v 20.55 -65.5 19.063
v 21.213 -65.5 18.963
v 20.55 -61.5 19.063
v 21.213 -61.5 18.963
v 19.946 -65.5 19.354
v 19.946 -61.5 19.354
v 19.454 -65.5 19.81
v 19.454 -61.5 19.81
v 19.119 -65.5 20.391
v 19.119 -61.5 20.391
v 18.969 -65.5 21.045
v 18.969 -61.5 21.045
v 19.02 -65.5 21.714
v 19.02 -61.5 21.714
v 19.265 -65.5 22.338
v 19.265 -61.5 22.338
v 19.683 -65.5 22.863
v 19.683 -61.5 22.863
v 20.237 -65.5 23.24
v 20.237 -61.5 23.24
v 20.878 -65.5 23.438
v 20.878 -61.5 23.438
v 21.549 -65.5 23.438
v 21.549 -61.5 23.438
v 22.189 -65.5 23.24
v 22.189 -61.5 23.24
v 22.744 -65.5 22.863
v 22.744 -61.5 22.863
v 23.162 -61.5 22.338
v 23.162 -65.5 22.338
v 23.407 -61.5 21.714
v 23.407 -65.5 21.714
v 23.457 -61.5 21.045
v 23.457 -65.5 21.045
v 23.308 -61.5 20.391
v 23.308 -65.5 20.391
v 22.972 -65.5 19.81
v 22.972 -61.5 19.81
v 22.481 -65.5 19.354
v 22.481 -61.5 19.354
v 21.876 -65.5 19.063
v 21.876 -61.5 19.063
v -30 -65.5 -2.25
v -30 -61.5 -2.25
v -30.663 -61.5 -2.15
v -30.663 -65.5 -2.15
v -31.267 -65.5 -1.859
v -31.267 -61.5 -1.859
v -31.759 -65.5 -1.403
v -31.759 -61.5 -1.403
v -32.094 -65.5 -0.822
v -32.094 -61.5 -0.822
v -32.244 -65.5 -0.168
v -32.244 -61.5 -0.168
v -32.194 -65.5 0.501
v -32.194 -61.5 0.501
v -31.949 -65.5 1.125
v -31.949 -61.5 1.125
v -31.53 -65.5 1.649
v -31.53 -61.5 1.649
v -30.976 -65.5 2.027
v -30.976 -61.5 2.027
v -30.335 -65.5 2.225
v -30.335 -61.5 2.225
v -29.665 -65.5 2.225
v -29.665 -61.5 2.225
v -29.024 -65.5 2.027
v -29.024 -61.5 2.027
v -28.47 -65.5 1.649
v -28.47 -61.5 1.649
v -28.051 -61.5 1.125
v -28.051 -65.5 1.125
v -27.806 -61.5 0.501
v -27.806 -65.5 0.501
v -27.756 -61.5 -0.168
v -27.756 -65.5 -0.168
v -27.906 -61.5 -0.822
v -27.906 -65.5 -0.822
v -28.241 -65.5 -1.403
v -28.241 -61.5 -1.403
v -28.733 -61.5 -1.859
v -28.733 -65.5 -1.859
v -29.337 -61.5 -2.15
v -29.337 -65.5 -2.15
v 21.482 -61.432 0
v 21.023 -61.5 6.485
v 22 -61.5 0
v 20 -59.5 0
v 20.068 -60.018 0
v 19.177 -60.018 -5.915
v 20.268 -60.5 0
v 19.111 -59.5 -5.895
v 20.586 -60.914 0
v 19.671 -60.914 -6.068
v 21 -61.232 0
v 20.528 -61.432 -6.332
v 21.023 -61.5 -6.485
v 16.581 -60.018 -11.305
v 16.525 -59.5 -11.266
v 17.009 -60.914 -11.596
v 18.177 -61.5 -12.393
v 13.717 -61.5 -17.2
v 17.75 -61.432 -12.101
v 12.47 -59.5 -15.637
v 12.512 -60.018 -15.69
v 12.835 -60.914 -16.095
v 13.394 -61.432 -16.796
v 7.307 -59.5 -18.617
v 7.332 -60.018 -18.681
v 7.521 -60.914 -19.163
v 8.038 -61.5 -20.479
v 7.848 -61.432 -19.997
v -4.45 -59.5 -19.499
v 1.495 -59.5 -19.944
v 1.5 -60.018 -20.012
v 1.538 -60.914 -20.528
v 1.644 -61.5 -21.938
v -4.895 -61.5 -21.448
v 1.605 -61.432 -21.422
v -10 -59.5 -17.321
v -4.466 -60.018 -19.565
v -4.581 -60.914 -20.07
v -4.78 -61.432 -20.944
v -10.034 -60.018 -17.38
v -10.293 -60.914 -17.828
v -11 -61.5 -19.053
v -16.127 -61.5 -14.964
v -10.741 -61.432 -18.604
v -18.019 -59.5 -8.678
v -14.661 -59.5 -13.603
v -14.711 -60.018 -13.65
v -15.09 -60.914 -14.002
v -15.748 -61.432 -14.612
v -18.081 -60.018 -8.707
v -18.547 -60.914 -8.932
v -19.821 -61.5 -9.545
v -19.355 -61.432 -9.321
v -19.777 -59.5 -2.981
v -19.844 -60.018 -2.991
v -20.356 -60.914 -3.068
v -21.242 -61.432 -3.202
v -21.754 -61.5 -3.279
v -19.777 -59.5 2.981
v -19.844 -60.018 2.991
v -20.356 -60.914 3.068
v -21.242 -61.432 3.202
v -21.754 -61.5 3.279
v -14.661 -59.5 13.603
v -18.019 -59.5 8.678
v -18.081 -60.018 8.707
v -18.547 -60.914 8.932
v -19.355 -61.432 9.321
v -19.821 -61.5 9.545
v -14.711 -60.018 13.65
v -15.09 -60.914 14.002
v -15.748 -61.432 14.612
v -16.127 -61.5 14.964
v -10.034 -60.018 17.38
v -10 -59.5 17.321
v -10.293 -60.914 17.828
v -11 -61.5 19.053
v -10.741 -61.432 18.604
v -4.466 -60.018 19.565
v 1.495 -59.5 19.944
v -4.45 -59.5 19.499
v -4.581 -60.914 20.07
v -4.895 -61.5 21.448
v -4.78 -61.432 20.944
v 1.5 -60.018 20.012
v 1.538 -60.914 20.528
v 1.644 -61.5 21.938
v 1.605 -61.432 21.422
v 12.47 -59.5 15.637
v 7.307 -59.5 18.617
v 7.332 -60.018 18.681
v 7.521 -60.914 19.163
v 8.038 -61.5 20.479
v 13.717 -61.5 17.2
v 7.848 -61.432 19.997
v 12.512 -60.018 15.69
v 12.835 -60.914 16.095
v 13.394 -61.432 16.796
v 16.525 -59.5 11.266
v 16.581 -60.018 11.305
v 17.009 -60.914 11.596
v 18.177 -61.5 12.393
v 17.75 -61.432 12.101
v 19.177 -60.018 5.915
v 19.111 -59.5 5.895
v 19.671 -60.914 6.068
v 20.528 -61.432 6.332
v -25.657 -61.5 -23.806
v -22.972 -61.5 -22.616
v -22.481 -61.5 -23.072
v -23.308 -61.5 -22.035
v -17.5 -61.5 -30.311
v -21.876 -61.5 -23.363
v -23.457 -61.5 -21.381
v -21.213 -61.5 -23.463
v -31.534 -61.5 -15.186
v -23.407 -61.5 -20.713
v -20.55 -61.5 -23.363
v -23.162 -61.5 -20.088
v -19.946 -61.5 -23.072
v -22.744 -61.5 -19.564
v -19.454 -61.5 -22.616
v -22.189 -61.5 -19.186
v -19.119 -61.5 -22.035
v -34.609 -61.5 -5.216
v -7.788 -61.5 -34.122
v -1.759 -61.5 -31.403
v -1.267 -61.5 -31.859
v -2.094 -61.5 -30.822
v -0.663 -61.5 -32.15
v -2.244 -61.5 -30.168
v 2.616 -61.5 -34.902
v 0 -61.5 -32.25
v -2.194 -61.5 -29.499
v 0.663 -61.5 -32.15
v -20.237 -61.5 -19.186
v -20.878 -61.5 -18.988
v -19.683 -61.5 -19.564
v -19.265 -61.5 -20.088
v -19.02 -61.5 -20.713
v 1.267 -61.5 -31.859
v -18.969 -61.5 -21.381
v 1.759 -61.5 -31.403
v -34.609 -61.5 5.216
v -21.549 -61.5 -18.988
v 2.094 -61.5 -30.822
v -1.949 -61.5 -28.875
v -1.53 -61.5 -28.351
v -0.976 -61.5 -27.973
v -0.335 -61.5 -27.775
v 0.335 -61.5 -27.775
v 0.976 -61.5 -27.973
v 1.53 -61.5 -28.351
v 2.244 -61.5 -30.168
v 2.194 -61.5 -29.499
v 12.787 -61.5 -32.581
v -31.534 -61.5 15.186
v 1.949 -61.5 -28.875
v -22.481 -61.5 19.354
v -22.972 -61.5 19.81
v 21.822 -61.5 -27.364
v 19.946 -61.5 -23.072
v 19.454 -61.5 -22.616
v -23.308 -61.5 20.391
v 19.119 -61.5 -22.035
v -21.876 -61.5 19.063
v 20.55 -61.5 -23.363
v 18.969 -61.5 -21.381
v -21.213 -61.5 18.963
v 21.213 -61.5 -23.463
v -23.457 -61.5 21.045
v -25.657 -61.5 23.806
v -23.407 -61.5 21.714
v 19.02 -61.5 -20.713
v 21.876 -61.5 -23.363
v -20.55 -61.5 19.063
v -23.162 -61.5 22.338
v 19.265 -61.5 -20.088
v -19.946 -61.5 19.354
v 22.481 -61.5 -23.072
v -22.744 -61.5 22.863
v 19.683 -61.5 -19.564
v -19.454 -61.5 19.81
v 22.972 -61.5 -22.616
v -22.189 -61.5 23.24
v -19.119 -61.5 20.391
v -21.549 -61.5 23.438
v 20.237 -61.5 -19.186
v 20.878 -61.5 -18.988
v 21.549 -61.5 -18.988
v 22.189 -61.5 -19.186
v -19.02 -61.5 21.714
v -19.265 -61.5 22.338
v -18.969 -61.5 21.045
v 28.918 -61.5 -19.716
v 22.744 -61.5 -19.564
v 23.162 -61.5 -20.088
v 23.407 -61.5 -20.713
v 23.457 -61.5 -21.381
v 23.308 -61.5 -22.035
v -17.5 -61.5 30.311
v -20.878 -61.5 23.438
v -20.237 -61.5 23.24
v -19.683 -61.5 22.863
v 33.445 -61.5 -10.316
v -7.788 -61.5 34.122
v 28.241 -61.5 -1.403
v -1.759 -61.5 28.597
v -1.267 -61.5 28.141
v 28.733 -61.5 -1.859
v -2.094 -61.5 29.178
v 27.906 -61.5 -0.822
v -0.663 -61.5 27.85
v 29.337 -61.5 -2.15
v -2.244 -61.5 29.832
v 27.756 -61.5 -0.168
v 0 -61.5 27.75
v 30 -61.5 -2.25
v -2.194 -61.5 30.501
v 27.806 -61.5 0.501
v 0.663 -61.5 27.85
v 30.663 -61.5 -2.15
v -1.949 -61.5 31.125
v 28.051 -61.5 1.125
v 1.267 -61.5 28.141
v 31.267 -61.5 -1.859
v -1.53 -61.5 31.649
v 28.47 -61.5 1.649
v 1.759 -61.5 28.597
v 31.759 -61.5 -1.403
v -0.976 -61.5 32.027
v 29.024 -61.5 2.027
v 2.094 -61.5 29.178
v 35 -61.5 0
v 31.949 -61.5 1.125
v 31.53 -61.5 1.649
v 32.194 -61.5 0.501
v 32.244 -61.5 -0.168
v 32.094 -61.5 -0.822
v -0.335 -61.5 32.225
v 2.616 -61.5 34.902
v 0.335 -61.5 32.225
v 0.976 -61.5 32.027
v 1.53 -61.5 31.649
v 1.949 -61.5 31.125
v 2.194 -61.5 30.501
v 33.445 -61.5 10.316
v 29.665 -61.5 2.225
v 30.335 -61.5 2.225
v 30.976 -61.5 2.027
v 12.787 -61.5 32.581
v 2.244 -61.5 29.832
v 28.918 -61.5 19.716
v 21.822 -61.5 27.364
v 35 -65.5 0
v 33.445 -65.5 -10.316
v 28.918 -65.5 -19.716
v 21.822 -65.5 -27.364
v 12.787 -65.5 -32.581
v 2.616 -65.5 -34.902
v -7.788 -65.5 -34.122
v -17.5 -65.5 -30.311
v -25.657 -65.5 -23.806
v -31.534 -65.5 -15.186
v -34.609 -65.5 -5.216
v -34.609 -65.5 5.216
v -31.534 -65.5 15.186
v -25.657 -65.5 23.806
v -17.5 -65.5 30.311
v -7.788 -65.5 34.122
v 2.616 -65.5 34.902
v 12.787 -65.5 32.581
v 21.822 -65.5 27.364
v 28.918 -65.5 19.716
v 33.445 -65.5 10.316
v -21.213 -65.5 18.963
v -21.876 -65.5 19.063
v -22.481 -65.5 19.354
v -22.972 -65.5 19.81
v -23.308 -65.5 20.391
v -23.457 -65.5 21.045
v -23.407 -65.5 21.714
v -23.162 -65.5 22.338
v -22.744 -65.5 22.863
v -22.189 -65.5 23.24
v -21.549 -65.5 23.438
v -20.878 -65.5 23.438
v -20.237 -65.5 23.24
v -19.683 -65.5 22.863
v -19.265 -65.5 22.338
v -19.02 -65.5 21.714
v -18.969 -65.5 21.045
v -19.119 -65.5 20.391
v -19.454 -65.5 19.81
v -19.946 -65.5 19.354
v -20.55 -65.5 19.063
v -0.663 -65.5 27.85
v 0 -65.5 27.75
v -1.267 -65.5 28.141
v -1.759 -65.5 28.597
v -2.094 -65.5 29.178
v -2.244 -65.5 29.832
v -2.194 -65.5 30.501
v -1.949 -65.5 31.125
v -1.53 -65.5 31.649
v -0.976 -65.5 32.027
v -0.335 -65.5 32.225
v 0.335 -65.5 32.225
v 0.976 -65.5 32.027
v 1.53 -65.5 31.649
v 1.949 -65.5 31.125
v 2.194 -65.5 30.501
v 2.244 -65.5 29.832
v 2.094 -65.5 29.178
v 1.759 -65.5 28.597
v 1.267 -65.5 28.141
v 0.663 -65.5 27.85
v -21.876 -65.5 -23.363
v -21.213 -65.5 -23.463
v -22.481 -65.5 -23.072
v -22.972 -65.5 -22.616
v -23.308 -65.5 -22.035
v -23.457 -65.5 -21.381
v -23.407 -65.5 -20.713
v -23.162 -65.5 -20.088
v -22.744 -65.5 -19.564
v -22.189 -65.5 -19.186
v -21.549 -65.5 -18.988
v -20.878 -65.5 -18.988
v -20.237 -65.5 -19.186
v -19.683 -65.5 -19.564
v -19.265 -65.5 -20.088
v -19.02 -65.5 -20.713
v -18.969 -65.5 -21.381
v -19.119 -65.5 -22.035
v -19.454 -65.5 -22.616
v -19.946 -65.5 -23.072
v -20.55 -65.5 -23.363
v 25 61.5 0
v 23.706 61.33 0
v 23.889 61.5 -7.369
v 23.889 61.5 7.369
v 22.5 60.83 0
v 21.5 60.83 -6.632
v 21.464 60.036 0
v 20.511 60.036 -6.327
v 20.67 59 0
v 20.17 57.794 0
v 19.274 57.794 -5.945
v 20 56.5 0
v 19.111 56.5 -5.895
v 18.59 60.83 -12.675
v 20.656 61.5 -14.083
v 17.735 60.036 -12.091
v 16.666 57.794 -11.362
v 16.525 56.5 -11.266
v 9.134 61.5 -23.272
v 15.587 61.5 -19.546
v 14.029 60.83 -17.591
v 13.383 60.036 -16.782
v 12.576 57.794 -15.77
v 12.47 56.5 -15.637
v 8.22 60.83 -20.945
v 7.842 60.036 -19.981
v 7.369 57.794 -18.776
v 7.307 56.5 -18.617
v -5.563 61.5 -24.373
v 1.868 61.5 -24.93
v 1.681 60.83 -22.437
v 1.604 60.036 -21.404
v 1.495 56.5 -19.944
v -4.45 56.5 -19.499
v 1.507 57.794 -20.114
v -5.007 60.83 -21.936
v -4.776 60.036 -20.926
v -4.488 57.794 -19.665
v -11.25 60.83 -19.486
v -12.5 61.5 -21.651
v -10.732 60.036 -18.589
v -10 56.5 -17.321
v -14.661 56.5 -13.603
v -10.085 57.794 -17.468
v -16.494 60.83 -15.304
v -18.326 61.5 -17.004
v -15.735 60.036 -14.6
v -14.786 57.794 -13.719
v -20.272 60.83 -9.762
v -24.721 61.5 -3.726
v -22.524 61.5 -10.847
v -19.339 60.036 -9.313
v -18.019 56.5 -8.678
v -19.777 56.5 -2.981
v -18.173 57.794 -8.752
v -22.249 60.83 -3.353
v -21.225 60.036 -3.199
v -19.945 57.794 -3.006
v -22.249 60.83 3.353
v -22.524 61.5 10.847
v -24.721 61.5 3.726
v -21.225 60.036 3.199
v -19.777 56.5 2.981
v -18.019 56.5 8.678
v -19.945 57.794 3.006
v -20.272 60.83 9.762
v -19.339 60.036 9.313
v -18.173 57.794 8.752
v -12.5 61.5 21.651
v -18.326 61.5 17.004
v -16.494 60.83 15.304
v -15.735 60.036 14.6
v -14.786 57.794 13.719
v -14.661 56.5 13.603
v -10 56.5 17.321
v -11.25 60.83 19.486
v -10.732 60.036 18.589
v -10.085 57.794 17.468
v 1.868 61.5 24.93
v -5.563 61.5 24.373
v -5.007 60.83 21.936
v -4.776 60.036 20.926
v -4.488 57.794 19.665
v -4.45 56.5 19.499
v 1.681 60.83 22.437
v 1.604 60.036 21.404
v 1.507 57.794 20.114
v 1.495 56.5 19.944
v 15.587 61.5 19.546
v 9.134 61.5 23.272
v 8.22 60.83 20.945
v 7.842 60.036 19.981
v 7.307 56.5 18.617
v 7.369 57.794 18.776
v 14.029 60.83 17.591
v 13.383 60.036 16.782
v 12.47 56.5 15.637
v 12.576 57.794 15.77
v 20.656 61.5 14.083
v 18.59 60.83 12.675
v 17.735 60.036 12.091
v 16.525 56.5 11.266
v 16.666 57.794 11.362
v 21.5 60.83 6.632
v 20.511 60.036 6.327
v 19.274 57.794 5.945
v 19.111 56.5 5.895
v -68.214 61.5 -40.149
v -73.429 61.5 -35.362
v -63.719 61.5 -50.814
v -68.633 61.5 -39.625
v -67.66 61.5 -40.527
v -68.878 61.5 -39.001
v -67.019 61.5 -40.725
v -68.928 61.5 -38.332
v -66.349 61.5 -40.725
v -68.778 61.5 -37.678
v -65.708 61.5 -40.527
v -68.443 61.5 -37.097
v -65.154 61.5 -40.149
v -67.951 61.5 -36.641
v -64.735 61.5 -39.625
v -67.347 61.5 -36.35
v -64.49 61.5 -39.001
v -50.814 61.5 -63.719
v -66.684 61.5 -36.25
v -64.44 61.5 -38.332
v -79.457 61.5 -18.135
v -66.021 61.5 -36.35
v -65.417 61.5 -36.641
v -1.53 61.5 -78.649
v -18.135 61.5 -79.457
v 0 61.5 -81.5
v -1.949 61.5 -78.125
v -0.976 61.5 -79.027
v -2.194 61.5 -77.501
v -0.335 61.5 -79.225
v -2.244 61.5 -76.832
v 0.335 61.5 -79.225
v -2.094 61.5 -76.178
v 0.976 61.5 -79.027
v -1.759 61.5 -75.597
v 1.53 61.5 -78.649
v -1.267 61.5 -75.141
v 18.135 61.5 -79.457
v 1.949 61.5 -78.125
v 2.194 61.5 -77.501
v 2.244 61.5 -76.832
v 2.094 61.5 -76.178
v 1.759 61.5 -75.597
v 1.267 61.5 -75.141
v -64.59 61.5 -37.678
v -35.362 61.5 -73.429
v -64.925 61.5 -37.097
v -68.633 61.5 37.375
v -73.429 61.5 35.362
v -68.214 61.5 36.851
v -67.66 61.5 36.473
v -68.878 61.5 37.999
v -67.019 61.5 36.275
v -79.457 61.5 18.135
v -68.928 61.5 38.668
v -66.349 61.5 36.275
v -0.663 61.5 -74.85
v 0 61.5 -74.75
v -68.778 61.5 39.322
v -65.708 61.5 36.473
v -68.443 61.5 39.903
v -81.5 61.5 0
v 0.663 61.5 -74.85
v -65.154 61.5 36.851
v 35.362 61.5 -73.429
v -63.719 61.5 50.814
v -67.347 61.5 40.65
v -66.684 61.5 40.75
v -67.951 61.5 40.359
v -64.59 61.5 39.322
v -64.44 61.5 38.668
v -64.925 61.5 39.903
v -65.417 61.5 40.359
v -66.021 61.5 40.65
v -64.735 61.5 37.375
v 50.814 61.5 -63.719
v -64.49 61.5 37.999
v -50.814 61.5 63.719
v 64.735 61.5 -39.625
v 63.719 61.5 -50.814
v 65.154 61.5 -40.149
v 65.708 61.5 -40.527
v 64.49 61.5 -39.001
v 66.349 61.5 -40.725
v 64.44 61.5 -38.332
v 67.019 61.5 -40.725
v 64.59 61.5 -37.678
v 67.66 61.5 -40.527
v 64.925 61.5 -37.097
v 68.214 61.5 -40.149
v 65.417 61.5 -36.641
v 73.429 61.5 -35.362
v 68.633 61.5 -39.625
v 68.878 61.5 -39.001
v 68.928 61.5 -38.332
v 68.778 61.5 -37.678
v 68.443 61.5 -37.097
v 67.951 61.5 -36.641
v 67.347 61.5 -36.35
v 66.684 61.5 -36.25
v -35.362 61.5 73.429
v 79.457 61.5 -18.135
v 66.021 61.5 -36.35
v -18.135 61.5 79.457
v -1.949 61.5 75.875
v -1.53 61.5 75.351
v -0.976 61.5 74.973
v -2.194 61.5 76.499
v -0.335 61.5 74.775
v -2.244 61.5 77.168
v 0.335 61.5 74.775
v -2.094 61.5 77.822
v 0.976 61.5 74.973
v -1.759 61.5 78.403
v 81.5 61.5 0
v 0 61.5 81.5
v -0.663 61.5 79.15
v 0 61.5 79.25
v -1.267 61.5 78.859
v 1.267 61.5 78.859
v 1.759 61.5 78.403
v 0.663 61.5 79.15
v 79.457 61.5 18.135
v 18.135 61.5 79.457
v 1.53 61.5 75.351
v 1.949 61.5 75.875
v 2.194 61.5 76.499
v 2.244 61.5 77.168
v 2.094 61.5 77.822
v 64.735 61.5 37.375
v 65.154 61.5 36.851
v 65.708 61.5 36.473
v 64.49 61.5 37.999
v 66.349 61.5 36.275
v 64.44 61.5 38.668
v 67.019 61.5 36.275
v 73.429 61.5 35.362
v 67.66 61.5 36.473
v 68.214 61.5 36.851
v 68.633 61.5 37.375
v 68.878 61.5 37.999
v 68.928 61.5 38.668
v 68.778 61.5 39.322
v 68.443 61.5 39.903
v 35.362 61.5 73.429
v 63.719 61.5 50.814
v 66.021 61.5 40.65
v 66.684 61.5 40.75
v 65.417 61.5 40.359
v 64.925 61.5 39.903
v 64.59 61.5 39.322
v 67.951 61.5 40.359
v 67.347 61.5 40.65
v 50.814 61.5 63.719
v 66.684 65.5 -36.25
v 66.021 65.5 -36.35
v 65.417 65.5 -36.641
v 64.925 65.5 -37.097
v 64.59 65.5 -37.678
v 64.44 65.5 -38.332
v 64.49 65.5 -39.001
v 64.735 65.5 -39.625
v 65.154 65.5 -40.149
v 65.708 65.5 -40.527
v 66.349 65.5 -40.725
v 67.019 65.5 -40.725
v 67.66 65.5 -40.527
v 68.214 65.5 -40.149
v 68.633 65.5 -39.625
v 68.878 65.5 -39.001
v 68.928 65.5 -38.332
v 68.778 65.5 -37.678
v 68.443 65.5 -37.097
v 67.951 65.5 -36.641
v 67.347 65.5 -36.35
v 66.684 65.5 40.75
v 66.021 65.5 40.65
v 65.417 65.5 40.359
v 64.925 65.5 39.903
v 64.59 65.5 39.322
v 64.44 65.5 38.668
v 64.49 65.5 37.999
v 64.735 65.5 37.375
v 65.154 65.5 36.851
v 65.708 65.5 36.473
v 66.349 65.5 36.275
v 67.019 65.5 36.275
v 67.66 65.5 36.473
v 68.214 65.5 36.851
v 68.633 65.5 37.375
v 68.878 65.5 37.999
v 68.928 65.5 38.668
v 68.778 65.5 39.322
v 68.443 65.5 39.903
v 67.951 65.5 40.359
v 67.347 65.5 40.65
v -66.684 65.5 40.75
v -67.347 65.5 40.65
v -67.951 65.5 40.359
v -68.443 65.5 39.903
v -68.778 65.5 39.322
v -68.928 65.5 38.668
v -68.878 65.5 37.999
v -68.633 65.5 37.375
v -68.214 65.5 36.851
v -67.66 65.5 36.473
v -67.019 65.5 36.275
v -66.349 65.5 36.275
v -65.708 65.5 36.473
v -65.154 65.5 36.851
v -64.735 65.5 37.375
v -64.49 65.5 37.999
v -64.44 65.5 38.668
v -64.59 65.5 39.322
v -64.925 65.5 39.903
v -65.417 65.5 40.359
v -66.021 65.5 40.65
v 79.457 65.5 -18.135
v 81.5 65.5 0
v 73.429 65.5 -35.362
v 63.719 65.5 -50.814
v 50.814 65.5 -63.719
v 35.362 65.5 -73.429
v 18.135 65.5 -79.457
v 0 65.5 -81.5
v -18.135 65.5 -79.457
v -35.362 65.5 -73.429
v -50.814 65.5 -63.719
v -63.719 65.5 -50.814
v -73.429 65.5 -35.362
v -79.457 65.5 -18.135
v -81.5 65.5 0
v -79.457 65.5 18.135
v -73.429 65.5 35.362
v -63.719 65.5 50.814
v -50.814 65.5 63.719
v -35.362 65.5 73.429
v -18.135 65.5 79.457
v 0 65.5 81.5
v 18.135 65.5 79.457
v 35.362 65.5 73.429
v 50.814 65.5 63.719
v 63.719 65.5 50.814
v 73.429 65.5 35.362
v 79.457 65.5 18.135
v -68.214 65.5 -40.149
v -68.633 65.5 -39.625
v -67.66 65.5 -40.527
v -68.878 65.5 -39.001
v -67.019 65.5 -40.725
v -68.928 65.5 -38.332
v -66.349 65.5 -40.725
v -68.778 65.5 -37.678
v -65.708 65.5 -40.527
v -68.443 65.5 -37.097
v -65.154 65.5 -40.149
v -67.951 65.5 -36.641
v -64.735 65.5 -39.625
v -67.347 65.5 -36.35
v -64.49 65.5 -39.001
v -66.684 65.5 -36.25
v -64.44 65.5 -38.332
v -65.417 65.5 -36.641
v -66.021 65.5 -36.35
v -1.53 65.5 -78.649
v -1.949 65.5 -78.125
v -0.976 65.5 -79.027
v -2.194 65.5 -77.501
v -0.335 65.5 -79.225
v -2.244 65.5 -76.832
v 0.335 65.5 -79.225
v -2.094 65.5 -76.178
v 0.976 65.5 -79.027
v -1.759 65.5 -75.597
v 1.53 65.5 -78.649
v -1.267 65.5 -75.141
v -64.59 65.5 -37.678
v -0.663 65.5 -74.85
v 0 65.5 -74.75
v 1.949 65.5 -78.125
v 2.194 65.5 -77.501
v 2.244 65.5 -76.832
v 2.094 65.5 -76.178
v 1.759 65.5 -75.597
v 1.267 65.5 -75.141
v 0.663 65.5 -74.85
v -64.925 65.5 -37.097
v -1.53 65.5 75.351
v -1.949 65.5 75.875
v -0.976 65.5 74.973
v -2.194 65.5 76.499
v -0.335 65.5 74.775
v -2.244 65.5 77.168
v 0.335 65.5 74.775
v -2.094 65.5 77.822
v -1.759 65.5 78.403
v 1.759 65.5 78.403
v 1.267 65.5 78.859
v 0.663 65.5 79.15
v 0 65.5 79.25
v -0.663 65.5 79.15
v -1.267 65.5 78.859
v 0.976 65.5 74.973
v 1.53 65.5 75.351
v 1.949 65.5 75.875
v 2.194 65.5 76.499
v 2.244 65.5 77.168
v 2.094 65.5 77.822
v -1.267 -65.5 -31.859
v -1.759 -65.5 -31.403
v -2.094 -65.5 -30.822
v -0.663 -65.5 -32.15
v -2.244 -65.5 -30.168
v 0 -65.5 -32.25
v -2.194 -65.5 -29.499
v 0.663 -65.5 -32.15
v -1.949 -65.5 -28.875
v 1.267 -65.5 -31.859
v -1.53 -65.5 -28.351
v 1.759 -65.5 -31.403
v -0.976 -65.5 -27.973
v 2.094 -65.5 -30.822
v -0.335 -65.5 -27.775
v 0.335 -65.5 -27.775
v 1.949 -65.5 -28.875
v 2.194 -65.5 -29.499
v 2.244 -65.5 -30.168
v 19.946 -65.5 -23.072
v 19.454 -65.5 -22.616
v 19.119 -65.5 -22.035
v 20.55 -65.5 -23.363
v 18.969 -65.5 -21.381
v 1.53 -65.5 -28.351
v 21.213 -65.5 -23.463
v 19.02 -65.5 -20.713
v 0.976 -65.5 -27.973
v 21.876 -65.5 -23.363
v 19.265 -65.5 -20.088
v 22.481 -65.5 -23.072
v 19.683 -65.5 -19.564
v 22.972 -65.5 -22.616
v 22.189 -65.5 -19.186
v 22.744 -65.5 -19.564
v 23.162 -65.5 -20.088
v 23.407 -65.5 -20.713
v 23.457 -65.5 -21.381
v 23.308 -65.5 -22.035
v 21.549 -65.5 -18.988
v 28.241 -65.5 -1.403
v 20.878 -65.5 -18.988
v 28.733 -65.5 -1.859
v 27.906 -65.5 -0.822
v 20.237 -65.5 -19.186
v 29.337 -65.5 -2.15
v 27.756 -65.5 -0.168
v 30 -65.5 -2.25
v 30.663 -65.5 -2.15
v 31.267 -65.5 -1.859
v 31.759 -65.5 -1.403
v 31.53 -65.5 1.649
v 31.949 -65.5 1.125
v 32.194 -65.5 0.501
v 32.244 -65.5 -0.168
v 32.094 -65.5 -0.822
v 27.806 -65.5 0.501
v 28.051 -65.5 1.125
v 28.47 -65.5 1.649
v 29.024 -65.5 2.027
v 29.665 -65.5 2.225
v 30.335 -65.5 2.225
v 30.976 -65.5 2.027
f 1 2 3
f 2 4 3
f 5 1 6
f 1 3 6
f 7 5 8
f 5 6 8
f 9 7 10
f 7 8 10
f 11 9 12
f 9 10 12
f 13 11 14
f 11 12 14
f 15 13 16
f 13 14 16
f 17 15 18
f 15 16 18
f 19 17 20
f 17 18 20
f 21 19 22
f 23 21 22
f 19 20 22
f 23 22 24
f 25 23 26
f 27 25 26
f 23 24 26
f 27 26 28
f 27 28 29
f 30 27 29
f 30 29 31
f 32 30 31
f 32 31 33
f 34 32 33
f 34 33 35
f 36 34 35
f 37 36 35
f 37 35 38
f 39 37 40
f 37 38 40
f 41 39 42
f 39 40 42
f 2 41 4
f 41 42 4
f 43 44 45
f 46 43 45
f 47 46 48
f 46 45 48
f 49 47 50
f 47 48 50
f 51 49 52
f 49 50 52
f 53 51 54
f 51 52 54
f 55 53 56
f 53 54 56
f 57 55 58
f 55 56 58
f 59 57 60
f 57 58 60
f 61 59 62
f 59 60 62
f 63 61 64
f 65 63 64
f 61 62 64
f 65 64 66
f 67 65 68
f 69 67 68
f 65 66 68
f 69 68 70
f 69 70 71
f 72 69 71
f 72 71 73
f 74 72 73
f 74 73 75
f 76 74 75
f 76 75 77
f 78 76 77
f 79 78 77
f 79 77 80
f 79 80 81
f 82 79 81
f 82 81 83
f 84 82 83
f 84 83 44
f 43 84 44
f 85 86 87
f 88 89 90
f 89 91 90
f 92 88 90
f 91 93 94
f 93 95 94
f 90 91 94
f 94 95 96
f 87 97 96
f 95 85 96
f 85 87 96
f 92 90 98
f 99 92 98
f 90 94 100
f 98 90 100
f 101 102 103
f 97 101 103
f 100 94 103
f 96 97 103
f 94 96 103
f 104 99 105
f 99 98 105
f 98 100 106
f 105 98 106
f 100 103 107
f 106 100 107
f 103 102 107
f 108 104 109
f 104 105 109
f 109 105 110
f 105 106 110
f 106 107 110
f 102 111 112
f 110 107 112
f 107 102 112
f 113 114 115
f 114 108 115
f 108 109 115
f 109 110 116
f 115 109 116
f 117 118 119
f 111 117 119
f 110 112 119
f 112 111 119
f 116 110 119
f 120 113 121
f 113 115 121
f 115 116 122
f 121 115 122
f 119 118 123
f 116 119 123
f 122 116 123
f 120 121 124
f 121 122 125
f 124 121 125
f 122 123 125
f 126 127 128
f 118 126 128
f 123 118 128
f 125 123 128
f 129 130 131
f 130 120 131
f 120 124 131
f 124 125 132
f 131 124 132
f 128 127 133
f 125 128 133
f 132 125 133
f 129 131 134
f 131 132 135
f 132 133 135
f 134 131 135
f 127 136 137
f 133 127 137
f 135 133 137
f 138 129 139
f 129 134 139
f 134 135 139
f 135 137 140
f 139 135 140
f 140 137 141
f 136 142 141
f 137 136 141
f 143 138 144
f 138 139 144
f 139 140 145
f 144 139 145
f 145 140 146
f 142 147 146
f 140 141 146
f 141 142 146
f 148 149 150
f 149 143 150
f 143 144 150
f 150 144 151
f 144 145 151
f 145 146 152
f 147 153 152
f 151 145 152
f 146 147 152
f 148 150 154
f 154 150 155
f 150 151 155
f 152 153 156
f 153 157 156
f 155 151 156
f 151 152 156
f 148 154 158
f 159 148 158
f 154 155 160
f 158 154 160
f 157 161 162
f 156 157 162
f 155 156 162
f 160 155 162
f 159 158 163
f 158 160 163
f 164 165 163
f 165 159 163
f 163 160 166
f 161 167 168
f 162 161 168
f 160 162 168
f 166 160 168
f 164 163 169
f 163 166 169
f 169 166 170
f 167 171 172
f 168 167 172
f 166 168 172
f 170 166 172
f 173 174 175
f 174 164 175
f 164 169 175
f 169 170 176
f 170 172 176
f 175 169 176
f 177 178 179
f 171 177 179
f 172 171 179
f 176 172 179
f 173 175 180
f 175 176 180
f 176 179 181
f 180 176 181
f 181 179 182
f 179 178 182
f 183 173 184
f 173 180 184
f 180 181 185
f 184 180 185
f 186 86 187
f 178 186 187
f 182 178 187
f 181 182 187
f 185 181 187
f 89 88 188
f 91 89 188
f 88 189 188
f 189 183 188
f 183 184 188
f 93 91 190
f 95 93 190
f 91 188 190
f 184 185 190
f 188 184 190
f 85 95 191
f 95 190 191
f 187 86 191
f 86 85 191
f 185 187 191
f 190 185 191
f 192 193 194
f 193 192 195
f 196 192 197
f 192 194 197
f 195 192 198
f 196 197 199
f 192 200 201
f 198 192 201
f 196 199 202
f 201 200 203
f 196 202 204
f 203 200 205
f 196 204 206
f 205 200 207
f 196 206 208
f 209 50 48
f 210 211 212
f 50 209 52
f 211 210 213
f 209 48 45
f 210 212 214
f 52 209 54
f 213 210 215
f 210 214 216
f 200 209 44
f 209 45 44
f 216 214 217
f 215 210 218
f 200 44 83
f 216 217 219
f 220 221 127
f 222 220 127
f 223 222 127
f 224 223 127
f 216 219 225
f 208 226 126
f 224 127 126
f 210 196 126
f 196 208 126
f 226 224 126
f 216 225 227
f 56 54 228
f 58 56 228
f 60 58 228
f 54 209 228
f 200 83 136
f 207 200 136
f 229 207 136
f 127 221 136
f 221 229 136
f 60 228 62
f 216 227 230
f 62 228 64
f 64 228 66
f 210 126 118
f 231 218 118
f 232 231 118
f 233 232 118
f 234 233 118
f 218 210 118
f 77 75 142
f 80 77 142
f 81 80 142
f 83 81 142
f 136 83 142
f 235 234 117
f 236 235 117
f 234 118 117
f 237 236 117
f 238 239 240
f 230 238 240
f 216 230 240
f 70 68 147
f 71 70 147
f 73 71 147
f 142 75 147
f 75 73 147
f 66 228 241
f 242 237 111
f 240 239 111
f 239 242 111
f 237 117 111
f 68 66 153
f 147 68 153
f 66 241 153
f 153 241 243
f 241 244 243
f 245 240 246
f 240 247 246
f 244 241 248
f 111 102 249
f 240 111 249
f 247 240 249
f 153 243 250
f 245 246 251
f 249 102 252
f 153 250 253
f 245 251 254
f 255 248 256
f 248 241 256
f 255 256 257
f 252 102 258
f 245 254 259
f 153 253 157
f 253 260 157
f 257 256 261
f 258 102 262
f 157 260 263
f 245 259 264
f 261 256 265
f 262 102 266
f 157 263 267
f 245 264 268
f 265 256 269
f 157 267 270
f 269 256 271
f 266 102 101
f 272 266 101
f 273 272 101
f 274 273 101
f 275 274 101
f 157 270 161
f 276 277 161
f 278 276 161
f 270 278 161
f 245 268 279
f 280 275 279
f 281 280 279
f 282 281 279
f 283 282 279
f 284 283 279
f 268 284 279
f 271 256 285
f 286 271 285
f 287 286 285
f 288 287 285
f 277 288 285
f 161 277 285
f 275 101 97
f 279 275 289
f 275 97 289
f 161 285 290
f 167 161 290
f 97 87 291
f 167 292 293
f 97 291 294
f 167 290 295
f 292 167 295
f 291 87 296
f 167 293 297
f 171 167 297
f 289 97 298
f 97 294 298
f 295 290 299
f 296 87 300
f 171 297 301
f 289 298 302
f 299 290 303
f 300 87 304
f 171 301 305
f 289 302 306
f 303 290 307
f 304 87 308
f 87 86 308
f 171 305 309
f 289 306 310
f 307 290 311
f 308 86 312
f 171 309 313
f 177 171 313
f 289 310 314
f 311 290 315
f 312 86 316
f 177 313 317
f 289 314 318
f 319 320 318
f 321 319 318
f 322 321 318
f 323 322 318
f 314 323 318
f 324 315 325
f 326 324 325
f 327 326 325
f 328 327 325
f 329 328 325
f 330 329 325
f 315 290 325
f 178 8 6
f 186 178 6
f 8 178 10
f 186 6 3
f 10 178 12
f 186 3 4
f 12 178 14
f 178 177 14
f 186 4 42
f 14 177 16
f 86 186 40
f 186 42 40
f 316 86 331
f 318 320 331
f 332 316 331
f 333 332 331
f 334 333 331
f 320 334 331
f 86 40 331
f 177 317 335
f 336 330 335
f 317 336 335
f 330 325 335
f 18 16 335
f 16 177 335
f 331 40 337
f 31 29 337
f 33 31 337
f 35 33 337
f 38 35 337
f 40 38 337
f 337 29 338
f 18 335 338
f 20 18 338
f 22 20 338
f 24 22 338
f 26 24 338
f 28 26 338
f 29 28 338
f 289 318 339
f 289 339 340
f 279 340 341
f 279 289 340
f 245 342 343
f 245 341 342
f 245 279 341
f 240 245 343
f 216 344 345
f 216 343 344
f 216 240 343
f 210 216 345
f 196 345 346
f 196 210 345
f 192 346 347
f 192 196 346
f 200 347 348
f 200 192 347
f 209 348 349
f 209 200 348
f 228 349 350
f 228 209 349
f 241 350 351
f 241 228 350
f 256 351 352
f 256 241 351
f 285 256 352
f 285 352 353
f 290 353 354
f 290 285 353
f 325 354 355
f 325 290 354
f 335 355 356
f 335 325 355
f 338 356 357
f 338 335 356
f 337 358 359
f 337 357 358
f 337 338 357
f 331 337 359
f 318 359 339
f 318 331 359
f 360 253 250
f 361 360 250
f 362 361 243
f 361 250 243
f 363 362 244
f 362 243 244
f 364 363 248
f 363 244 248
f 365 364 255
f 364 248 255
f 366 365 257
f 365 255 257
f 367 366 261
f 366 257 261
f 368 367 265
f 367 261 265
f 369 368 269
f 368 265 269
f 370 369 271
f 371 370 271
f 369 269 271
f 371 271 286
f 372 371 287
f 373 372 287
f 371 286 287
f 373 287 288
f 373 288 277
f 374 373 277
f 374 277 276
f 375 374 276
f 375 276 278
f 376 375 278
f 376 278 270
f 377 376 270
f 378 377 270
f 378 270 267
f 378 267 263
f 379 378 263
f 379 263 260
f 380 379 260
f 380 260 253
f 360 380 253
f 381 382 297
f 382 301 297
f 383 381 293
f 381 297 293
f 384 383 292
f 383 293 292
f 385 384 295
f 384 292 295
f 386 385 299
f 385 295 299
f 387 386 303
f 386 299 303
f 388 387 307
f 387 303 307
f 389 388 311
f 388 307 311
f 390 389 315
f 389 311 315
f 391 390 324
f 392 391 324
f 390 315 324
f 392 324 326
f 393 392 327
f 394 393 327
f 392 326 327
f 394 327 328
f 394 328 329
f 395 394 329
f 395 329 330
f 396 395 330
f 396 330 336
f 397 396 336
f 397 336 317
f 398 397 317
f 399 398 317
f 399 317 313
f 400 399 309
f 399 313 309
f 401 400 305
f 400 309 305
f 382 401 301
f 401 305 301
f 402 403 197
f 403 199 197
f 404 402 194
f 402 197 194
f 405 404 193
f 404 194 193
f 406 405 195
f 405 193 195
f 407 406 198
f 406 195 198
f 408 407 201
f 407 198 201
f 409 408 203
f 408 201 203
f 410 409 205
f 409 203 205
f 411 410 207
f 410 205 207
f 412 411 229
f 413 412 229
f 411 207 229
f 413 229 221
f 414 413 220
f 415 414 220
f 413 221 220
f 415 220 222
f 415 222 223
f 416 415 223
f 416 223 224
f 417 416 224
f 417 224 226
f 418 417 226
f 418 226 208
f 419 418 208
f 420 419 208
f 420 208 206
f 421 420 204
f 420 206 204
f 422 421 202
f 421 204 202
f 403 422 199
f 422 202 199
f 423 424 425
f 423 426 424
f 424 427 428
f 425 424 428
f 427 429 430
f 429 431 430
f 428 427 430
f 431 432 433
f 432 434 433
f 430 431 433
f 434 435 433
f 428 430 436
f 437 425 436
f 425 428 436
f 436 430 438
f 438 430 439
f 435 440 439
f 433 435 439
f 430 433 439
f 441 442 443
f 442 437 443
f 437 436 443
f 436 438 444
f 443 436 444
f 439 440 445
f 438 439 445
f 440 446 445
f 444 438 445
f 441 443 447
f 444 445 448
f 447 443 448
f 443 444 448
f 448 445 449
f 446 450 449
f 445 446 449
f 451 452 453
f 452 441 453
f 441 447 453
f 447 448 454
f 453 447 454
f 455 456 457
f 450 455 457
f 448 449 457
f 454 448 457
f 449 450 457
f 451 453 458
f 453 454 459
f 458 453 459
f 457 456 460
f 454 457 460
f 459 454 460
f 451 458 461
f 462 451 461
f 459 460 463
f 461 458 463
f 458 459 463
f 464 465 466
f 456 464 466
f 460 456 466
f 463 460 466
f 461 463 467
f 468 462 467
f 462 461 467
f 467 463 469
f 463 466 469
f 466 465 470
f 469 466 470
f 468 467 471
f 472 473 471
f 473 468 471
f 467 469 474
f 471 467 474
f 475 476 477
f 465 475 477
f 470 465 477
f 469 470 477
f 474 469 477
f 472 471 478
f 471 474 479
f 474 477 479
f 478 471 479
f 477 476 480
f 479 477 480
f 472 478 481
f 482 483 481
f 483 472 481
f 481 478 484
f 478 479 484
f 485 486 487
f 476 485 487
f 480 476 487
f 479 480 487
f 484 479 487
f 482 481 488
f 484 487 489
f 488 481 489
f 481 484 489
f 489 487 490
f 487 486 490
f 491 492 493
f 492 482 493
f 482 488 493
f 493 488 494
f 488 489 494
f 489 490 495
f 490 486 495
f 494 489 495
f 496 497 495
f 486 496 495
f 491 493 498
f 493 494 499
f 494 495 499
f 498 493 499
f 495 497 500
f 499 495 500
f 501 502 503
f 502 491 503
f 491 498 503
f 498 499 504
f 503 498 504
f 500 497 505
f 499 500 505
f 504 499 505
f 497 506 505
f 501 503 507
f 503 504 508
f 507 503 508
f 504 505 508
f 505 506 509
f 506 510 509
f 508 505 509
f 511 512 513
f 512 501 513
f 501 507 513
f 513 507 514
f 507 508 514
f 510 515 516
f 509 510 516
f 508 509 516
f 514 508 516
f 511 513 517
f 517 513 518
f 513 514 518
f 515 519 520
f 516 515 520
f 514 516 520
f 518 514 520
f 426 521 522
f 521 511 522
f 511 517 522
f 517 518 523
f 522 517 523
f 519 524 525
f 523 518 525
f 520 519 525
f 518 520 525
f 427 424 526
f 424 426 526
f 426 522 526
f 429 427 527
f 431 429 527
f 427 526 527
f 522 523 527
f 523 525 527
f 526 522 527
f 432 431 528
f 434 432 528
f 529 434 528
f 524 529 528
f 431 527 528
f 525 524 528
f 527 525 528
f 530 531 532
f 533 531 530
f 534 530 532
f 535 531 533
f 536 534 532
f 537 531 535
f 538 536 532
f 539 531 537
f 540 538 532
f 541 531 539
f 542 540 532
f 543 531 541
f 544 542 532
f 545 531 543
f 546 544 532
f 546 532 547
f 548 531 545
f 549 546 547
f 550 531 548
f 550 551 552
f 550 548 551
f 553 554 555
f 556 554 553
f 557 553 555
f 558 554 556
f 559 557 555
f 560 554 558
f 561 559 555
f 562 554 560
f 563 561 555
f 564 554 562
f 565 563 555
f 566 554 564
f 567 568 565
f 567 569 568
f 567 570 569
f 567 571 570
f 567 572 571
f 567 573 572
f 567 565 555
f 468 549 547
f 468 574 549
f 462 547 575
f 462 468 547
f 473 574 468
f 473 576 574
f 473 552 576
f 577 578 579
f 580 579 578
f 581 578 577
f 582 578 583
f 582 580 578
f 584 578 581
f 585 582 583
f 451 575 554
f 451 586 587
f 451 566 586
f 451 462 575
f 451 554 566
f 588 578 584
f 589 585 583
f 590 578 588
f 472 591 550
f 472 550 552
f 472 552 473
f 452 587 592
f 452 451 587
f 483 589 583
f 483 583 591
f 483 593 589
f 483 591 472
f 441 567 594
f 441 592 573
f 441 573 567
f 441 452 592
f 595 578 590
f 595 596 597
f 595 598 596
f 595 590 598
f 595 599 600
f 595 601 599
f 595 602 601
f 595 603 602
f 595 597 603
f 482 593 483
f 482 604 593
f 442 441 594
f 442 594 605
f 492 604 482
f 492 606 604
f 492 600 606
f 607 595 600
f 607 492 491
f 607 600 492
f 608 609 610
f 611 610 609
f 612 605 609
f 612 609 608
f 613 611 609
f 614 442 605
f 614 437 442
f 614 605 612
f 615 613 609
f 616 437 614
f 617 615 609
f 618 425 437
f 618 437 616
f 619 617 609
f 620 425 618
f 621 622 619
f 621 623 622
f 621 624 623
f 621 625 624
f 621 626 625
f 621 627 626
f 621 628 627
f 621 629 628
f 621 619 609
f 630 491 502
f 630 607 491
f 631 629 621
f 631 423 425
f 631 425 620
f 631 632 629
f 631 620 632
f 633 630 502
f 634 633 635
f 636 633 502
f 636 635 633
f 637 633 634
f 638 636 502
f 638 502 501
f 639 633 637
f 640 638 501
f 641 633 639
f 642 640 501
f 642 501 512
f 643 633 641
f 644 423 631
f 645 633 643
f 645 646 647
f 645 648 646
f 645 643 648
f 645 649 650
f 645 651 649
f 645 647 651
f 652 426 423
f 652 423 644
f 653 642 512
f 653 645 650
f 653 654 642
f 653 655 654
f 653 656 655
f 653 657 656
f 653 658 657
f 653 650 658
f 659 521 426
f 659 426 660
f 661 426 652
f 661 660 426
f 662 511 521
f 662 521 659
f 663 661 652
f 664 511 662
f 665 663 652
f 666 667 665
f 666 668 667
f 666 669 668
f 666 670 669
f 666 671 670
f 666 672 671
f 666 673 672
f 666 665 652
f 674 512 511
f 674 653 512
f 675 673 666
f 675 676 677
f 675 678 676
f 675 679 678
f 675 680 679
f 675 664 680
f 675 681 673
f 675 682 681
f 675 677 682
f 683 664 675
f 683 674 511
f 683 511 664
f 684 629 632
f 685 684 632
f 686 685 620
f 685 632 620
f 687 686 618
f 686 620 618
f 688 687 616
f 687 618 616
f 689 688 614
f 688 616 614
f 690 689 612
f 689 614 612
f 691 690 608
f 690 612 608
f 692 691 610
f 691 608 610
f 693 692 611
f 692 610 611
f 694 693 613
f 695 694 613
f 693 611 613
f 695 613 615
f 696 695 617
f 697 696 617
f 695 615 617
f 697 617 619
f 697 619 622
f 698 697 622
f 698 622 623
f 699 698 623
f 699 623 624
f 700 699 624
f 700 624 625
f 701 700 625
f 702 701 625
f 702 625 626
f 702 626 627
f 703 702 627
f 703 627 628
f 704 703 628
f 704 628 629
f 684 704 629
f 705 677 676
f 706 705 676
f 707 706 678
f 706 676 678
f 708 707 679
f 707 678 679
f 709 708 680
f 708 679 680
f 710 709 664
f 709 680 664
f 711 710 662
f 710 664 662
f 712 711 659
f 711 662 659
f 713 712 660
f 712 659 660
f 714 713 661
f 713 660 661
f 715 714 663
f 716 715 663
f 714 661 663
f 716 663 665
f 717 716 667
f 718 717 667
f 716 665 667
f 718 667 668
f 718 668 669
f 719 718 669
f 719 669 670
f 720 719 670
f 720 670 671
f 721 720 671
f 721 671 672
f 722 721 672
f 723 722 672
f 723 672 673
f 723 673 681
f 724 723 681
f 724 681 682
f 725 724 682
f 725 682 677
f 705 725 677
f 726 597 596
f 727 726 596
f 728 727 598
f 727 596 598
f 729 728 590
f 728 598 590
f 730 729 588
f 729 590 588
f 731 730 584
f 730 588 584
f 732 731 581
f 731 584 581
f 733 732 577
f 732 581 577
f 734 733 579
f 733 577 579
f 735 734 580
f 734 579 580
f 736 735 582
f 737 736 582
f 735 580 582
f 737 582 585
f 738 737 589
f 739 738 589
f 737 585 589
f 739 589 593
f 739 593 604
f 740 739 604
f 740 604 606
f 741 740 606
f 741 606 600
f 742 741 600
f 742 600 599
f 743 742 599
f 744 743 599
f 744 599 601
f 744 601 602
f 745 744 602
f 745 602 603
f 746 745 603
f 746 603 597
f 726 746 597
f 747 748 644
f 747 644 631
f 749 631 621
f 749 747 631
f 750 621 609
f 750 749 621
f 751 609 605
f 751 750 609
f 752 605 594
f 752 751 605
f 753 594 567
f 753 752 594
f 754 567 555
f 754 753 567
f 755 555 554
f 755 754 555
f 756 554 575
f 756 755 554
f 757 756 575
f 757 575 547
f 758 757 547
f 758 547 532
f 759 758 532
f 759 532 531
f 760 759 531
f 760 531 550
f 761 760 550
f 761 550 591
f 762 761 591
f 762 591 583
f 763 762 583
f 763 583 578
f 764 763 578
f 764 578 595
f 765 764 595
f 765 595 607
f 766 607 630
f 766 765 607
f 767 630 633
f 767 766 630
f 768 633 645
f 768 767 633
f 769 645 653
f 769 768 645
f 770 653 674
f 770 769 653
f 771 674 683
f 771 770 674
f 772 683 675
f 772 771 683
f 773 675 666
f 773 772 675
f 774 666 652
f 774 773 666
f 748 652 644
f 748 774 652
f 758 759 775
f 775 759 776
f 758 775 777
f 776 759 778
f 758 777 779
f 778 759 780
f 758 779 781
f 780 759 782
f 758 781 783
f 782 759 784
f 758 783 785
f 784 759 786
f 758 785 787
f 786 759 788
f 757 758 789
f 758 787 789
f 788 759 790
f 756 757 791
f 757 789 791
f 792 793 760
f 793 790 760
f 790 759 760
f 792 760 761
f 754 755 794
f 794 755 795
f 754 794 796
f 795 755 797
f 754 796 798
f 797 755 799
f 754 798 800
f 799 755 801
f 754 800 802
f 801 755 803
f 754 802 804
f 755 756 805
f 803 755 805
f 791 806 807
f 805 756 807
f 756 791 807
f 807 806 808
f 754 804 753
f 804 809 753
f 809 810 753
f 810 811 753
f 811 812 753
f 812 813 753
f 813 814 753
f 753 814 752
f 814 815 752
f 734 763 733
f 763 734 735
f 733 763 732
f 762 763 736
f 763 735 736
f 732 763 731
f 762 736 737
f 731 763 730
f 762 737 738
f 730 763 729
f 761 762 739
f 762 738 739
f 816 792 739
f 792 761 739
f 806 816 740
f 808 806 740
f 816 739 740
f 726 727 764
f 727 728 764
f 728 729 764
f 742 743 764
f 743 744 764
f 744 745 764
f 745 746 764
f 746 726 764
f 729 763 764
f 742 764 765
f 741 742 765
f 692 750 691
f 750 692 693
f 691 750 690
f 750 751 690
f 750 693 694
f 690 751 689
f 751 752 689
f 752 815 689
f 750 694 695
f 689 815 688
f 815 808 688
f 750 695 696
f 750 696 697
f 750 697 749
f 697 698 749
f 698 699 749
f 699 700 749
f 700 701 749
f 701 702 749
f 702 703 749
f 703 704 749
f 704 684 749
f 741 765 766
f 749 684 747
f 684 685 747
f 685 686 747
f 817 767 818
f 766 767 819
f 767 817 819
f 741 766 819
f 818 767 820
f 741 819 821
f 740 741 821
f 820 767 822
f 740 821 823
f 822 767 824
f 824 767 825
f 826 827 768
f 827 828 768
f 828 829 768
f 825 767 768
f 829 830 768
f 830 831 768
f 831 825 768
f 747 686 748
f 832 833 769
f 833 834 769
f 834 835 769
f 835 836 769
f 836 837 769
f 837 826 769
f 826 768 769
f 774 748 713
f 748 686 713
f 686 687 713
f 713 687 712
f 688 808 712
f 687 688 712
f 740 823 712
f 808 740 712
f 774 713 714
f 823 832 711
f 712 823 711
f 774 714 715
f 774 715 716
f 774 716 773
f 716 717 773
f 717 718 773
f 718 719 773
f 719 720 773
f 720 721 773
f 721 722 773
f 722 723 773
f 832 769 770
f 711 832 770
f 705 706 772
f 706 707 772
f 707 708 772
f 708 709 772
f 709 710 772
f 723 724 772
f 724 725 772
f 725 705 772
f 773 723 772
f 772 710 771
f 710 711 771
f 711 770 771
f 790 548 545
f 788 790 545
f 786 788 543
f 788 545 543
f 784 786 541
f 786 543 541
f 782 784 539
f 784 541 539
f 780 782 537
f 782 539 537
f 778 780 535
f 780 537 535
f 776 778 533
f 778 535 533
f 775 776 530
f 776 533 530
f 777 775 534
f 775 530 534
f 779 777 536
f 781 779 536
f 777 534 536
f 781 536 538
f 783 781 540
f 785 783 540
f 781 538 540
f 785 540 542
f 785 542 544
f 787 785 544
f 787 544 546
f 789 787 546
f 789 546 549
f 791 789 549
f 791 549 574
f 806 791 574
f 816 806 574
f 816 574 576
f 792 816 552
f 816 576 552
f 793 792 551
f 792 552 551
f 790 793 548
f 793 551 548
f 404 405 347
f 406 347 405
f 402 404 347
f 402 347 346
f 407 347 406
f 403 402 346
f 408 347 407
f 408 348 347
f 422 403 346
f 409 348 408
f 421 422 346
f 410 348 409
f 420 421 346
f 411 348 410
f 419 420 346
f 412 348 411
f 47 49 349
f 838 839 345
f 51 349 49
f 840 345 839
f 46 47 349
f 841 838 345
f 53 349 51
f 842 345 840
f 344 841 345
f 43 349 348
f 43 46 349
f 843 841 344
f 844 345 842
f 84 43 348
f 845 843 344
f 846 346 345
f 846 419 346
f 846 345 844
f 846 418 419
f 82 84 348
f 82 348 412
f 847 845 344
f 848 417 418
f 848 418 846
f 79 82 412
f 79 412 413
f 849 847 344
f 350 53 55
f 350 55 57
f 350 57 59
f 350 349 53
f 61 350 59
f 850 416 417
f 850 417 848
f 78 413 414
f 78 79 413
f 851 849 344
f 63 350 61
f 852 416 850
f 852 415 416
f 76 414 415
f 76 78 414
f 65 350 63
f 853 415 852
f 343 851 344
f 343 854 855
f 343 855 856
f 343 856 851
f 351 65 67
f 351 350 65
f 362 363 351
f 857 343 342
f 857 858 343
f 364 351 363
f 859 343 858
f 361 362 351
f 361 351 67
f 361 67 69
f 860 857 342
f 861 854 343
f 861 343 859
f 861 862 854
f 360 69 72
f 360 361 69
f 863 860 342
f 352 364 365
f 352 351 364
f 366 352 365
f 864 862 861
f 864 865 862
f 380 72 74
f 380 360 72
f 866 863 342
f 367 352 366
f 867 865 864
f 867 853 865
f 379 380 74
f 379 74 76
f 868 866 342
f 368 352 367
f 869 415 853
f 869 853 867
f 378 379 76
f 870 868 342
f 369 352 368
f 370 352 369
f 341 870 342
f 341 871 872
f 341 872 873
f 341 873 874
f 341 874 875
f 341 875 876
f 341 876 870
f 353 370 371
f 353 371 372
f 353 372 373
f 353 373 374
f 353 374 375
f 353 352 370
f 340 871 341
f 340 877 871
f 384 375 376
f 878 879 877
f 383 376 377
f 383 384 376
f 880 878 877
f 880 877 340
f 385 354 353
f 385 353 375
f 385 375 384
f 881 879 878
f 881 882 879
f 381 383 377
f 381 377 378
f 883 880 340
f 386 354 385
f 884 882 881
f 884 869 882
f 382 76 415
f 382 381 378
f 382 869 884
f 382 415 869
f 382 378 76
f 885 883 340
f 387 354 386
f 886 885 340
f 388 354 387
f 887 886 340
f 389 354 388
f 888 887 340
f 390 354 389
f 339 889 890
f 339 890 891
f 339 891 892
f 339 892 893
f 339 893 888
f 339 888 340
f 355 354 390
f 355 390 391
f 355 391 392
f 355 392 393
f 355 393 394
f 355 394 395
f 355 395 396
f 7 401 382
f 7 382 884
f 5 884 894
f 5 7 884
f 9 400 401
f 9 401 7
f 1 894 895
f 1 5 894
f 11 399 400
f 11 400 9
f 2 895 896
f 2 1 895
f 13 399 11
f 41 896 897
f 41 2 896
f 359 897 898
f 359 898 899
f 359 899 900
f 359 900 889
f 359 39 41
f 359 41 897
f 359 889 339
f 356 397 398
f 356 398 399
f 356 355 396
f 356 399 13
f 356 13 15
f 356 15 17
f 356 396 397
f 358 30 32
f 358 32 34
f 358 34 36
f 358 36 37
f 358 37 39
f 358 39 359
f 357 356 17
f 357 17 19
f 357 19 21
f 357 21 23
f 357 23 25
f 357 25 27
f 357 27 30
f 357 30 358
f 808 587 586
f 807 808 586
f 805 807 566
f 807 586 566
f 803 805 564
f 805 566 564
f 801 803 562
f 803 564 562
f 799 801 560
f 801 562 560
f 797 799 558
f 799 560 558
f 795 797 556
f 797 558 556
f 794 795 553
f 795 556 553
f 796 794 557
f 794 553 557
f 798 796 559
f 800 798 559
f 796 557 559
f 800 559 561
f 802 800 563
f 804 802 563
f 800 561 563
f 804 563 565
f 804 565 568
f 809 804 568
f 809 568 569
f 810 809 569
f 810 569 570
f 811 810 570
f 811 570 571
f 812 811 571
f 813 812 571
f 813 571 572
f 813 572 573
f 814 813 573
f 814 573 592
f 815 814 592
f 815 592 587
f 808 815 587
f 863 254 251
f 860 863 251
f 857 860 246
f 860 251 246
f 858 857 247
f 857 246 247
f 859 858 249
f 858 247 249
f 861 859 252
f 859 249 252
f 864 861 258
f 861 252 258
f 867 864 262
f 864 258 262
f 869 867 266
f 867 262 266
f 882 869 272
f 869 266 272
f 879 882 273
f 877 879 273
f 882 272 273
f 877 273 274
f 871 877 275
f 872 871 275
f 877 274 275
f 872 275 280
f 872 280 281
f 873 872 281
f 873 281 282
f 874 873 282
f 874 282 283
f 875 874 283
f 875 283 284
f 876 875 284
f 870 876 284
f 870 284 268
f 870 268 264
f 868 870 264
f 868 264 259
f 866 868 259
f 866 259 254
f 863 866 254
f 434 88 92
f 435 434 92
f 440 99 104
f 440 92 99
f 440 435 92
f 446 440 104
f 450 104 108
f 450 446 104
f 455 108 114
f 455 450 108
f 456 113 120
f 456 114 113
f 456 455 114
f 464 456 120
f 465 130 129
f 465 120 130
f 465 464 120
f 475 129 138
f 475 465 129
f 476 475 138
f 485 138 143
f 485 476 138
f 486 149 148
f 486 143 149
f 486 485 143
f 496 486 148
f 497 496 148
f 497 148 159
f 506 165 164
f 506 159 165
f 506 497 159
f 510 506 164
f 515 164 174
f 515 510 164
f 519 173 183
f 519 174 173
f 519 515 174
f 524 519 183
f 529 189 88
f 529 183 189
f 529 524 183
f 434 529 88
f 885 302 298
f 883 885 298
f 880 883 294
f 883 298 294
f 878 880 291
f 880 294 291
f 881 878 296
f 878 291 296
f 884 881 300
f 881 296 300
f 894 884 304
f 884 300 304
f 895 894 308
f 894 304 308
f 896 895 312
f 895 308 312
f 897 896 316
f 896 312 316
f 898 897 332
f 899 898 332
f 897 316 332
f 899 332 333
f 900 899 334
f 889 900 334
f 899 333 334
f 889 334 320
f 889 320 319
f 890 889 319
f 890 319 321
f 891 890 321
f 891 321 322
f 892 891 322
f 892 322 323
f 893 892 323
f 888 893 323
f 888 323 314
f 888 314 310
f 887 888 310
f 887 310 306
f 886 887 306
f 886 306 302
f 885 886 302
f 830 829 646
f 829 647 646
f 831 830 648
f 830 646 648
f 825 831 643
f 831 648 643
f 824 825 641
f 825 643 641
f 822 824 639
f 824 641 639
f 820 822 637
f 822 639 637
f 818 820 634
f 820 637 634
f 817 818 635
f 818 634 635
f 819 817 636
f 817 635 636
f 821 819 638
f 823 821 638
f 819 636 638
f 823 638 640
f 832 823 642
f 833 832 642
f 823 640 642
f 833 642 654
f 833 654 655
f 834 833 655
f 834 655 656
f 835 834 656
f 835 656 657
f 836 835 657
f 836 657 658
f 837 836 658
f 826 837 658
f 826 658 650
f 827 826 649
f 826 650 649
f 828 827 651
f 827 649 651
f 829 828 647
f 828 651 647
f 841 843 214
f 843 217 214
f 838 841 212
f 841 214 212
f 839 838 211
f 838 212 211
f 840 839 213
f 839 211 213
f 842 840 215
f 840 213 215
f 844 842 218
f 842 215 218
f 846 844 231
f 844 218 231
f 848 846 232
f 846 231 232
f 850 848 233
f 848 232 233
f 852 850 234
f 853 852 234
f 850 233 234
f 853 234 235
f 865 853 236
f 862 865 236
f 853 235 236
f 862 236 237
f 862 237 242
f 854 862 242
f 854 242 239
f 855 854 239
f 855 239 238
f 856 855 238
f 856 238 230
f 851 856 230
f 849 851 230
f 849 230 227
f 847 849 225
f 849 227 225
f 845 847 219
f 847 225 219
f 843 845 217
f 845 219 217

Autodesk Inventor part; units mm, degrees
ref_plane "YZ Plane" through (0, 0, 0) normal (1, 0, 0) x (0, 1, 0)
ref_plane "XZ Plane" through (0, 0, 0) normal (0, 1, 0) x (-1, 0, 0)
ref_plane "XY Plane" through (0, 0, 0) normal (0, 0, 1) x (1, 0, 0)
sketch "Sketch1" plane through (0, 0, 0) normal (0, 0, 1) x (1, 0, 0)
  line L0 (0, 91.7) -> (0, -91.7) construction
  line L1 (-16.3, 0) -> (97.8, 0) construction
  line L2 (0, -65.5) -> (0, 65.5)
  line L3 (0, -65.5) -> (81.5, -65.5)
  line L4 (81.5, -65.5) -> (81.5, 65.5)
  line L5 (81.5, 65.5) -> (0, 65.5)
  point P0 (0, 0)
  dimension "d2" = 131
  dimension "d12" = 81.5
revolve "Revolution1" add sketch "Sketch1" angle 360 about axis through (0, 0, 0) along (0, -1, 0)
sketch "Sketch4" plane through (0, 0, 0) normal (0, 0, 1) x (1, 0, 0)
  line L0 (-81.5, 65.5) -> (81.5, 65.5) construction
  line L1 (-81.5, -65.5) -> (81.5, -65.5) construction
  line L2 (0, 91) -> (0, -91) construction
  line L3 (-114.1, 0) -> (114.1, 0) construction
  line L4 (35, -61.5) -> (22, -61.5)
  line L5 (20, -59.5) -> (20, 56.5)
  line L6 (25, 61.5) -> (81.5, 61.5)
  line L7 (81.5, 65.5) -> (81.5, -65.5) construction
  line L8 (81.5, -65.5) -> (81.5, 61.5)
  arc A0 (20, -59.5) -> (22, -61.5) centre (22, -59.5) ccw
  arc A1 (25, 61.5) -> (20, 56.5) centre (25, 56.5) ccw
  line L9 (35, -65.5) -> (35, -61.5)
  line L10 (-81.5, -65.5) -> (81.5, -65.5) construction
  line L11 (35, -65.5) -> (81.5, -65.5)
  point P0 (0, 0)
  dimension "d35" = 20
  dimension "d36" = 4
  dimension "d37" = 2
  dimension "d39" = 35
  dimension "d40" = 5
revolve "Revolution2" cut sketch "Sketch4" angle 360 about axis through (0, 0, 0) along (0, -1, 0)
sketch "Sketch2" plane through (0, -65.5, 0) normal (0, -1, 0) x (1, 0, 0)
  circle A0 centre (0, 0) radius 81.5 construction
  line L0 (-114.1, 0) -> (114.1, 0) construction
  line L1 (0, 114.1) -> (0, -114.1) construction
  circle A1 centre (0, 0) radius 21.25 construction
  circle A2 centre (0, 0) radius 30 construction
  point P0 (0, 30)
  point P1 (0, 21.25)
  point P2 (-21.2132, 21.2132)
  point P3 (-15.026, 15.026)
  point P4 (-30, 0)
  point P5 (-21.25, 0)
  point P6 (-21.2132, -21.2132)
  point P7 (-15.026, -15.026)
  point P8 (0, -30)
  point P9 (0, -21.25)
  point P10 (21.2132, -21.2132)
  point P11 (15.026, -15.026)
  point P12 (30, 0)
  point P13 (21.25, 0)
  point P14 (21.2132, 21.2132)
  point P15 (15.026, 15.026)
  point P16 (-4.5183, 21.1087)
  dimension "d6" = 42.5
  dimension "d7" = 60
  dimension "d10" = 360
hole "Hole2" at (0, -65.5, 30) at (-21.2132, -65.5, 21.2132) at (-30, -65.5, 0) at (-21.2132, -65.5, -21.2132) at (0, -65.5, -30) at (21.2132, -65.5, -21.2132) at (30, -65.5, 0) at (21.2132, -65.5, 21.2132) direction (0, 1, 0) diameter 4.5 depth 4 clearance for "Socket Head Cap Screw" size "M4" standard "Ansi Metric M Profile"
sketch "Sketch5" plane through (0, 65.5, 0) normal (0, 1, 0) x (1, 0, 0)
  line L0 (0, 114.1) -> (0, -114.1) construction
  line L1 (114.1, 0) -> (-114.1, 0) construction
  circle A0 centre (0, 0) radius 77 construction
  point P0 (0, 77)
  point P1 (-66.684, 38.5)
  point P2 (-66.684, -38.5)
  point P3 (0, -77)
  point P4 (66.684, -38.5)
  point P5 (66.684, 38.5)
  dimension "d45" = 154
  dimension "d43" = 360
hole "Hole3" at (0, 65.5, -77) at (-66.684, 65.5, -38.5) at (-66.684, 65.5, 38.5) at (0, 65.5, 77) at (66.684, 65.5, 38.5) at (66.684, 65.5, -38.5) direction (0, -1, 0) diameter 4.5 depth 4 clearance for "Socket Head Cap Screw" size "M4" standard "Ansi Metric M Profile"
properties part number "Connection_link_1"
